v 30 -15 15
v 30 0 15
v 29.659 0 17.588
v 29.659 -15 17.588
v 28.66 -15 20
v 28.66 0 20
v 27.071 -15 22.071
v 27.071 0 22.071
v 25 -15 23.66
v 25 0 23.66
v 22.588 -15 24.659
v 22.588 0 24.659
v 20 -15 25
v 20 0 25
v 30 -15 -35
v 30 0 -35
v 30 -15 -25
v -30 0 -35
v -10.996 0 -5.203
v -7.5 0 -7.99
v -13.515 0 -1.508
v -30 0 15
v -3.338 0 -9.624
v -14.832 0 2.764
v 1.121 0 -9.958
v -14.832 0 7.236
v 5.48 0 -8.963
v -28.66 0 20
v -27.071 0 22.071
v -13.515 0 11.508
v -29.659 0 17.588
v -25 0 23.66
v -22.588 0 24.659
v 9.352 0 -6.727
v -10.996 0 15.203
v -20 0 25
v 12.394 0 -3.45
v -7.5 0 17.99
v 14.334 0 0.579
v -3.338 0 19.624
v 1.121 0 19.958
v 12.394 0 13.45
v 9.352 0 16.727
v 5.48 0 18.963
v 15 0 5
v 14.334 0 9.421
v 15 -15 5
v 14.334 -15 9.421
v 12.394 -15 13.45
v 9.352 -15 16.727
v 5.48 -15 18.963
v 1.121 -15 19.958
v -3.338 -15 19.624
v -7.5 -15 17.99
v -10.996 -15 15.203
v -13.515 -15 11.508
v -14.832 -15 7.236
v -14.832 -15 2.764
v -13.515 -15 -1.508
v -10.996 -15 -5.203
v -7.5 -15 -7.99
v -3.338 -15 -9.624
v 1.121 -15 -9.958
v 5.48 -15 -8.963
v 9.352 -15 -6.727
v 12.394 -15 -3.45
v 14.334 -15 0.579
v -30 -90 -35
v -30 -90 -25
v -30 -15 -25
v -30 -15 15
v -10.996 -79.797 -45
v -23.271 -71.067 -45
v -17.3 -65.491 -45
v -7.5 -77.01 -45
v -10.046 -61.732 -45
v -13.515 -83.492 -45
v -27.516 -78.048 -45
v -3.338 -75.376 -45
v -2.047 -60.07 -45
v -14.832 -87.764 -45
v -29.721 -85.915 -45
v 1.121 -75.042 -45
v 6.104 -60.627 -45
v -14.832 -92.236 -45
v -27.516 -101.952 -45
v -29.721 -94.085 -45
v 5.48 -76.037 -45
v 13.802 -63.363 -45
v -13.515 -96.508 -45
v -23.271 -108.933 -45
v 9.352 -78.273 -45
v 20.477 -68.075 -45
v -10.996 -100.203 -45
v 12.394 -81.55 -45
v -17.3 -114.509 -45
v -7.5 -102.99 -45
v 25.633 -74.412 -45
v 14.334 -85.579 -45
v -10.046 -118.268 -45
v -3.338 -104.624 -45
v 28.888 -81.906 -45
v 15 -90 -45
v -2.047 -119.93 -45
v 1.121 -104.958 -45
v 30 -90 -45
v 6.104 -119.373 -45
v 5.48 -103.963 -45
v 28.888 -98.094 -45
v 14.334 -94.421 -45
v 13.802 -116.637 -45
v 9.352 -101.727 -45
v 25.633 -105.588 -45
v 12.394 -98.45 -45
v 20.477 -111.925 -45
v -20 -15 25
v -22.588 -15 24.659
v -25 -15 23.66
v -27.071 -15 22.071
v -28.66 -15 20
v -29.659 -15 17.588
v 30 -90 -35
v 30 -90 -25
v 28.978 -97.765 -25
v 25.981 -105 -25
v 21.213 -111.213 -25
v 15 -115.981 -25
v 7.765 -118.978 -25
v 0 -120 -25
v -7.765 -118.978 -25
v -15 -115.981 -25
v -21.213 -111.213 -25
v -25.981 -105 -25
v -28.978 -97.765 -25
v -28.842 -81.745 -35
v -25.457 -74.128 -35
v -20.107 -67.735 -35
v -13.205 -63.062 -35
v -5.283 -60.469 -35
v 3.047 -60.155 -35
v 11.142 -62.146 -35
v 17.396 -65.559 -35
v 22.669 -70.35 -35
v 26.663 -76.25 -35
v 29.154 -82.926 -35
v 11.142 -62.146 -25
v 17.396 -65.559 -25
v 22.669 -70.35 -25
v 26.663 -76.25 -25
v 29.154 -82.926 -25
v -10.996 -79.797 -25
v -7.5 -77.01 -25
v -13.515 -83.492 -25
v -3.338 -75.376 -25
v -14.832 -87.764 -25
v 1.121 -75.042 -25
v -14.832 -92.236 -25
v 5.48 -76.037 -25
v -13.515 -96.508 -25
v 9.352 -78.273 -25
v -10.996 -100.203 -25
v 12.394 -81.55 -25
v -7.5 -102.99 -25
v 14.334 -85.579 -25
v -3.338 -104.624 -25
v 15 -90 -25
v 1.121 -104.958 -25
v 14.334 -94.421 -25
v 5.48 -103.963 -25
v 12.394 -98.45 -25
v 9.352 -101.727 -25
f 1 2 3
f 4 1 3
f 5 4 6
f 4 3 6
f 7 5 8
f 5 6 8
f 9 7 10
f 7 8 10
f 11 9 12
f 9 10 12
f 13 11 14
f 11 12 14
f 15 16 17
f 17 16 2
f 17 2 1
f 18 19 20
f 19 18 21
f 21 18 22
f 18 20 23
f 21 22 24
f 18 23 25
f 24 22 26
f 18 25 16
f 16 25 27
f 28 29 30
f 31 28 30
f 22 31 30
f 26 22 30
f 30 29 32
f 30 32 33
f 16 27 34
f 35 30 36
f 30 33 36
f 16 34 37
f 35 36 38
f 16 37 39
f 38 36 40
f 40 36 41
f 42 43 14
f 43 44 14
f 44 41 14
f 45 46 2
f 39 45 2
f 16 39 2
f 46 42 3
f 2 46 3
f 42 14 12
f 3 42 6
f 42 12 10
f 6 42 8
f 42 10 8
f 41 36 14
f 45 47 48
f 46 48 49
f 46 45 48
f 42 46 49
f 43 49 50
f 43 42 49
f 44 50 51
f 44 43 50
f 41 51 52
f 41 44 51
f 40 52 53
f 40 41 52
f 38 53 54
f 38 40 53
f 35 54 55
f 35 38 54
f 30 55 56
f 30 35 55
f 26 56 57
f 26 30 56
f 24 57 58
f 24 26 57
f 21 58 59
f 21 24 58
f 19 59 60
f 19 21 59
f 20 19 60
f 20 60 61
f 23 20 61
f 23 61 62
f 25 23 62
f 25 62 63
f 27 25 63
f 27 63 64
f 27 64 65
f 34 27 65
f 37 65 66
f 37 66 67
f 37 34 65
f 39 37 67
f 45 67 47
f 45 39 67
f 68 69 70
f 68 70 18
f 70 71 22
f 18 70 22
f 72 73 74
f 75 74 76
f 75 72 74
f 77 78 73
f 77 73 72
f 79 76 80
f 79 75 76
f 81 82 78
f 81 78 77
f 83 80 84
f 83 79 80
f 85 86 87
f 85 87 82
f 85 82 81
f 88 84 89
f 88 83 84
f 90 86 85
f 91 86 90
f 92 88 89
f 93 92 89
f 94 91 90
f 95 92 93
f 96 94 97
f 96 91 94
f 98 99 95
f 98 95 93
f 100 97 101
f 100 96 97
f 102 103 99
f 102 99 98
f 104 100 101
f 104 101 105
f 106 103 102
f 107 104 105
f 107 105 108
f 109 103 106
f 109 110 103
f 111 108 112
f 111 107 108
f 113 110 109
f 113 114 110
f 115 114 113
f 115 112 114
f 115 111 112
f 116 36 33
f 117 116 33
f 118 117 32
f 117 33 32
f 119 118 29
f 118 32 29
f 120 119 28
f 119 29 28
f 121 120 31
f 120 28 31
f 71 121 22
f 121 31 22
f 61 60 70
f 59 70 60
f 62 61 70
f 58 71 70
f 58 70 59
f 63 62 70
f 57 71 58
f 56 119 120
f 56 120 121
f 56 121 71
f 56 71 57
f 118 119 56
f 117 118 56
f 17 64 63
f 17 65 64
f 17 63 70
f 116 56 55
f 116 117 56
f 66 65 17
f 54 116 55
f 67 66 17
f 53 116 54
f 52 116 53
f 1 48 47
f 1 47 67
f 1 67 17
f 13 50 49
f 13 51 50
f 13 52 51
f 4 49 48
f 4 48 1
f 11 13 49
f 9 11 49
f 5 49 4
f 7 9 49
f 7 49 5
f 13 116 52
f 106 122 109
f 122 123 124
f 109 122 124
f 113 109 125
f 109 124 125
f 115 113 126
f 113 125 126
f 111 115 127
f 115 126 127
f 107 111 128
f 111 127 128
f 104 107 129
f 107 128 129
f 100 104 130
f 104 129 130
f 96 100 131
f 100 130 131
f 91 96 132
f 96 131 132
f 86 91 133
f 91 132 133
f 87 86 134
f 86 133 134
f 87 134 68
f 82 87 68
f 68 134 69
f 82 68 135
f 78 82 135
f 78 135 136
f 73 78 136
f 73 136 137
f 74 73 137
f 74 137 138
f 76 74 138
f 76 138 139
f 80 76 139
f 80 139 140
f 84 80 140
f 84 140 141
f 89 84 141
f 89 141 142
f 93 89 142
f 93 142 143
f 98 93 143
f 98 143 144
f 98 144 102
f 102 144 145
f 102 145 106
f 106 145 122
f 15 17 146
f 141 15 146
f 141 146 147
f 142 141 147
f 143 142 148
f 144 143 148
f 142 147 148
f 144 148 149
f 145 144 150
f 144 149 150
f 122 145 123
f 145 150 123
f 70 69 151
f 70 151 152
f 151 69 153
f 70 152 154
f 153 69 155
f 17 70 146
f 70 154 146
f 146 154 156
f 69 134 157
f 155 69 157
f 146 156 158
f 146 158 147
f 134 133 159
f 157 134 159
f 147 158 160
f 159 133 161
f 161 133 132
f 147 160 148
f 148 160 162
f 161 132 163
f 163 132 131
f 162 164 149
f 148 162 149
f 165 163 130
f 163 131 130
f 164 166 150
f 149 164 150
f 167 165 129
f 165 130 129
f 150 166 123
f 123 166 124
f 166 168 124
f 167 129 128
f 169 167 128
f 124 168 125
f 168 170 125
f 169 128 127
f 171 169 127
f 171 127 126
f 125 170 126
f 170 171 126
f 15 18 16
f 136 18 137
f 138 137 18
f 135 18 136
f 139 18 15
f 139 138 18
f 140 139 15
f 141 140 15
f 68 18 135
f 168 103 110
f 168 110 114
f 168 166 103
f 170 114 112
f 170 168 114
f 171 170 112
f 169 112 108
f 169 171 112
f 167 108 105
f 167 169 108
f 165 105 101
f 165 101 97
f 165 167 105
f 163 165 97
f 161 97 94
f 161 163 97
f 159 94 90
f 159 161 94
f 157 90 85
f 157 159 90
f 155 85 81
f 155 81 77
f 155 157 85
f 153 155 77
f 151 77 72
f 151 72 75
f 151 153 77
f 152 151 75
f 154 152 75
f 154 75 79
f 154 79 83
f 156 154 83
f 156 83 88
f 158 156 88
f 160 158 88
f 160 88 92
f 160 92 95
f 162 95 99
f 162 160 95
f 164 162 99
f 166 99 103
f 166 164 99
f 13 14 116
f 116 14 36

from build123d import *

# Parameters (mm, degrees)
F0_R     = 15
F1_DEPTH = 15
F2_R     = 15
F3_DEPTH = 10
F4_R     = 30
F4_R_2   = 15
F5_DEPTH = 10


with BuildPart() as f1:
    # F0 (on Front) → F1 (new body)
    with BuildSketch(Plane.XZ):
        with BuildLine():
            ThreePointArc((30, 15), (27.071068, 22.071068), (20, 25))
            Line((20, 25), (-20, 25))
            ThreePointArc((-20, 25), (-27.071068, 22.071068), (-30, 15))
            Line((-30, 15), (-30, -25))
            Line((-30, -25), (30, -25))
            Line((30, -25), (30, 15))
        make_face()
        with Locations((0, 5)):
            Circle(F0_R, mode=Mode.SUBTRACT)
    extrude(amount=F1_DEPTH)

    # F2 (on face) → F3 (join)
    with BuildSketch(Plane(origin=(0, 0, -25), x_dir=(1, 0, 0), z_dir=(0, 0, -1))):
        with BuildLine():
            ThreePointArc((11.14172, 62.145699), (24.842017, 73.181136), (30, 90))
            ThreePointArc((30, 90), (0, 120), (-30, 90))
            ThreePointArc((-30, 90), (-16.818864, 65.157983), (11.14172, 62.145699))
        make_face()
        with Locations((0, 90)):
            Circle(F2_R, mode=Mode.SUBTRACT)
        with BuildLine():
            ThreePointArc((11.14172, 62.145699), (-16.818864, 65.157983), (-30, 90))
            Line((-30, 90), (-30, 15))
            Line((-30, 15), (-30, 0))
            Line((-30, 0), (30, 0))
            Line((30, 0), (30, 15))
            Line((30, 15), (11.14172, 62.145699))
        make_face()
    extrude(amount=F3_DEPTH)

    # F4 (on face) → F5 (join)
    with BuildSketch(Plane(origin=(0, 0, -35), x_dir=(1, 0, 0), z_dir=(0, 0, -1))):
        with Locations((0, 90)):
            Circle(F4_R)
        with Locations((0, 90)):
            Circle(F4_R_2, mode=Mode.SUBTRACT)
    extrude(amount=F5_DEPTH)


solid = f1.part
